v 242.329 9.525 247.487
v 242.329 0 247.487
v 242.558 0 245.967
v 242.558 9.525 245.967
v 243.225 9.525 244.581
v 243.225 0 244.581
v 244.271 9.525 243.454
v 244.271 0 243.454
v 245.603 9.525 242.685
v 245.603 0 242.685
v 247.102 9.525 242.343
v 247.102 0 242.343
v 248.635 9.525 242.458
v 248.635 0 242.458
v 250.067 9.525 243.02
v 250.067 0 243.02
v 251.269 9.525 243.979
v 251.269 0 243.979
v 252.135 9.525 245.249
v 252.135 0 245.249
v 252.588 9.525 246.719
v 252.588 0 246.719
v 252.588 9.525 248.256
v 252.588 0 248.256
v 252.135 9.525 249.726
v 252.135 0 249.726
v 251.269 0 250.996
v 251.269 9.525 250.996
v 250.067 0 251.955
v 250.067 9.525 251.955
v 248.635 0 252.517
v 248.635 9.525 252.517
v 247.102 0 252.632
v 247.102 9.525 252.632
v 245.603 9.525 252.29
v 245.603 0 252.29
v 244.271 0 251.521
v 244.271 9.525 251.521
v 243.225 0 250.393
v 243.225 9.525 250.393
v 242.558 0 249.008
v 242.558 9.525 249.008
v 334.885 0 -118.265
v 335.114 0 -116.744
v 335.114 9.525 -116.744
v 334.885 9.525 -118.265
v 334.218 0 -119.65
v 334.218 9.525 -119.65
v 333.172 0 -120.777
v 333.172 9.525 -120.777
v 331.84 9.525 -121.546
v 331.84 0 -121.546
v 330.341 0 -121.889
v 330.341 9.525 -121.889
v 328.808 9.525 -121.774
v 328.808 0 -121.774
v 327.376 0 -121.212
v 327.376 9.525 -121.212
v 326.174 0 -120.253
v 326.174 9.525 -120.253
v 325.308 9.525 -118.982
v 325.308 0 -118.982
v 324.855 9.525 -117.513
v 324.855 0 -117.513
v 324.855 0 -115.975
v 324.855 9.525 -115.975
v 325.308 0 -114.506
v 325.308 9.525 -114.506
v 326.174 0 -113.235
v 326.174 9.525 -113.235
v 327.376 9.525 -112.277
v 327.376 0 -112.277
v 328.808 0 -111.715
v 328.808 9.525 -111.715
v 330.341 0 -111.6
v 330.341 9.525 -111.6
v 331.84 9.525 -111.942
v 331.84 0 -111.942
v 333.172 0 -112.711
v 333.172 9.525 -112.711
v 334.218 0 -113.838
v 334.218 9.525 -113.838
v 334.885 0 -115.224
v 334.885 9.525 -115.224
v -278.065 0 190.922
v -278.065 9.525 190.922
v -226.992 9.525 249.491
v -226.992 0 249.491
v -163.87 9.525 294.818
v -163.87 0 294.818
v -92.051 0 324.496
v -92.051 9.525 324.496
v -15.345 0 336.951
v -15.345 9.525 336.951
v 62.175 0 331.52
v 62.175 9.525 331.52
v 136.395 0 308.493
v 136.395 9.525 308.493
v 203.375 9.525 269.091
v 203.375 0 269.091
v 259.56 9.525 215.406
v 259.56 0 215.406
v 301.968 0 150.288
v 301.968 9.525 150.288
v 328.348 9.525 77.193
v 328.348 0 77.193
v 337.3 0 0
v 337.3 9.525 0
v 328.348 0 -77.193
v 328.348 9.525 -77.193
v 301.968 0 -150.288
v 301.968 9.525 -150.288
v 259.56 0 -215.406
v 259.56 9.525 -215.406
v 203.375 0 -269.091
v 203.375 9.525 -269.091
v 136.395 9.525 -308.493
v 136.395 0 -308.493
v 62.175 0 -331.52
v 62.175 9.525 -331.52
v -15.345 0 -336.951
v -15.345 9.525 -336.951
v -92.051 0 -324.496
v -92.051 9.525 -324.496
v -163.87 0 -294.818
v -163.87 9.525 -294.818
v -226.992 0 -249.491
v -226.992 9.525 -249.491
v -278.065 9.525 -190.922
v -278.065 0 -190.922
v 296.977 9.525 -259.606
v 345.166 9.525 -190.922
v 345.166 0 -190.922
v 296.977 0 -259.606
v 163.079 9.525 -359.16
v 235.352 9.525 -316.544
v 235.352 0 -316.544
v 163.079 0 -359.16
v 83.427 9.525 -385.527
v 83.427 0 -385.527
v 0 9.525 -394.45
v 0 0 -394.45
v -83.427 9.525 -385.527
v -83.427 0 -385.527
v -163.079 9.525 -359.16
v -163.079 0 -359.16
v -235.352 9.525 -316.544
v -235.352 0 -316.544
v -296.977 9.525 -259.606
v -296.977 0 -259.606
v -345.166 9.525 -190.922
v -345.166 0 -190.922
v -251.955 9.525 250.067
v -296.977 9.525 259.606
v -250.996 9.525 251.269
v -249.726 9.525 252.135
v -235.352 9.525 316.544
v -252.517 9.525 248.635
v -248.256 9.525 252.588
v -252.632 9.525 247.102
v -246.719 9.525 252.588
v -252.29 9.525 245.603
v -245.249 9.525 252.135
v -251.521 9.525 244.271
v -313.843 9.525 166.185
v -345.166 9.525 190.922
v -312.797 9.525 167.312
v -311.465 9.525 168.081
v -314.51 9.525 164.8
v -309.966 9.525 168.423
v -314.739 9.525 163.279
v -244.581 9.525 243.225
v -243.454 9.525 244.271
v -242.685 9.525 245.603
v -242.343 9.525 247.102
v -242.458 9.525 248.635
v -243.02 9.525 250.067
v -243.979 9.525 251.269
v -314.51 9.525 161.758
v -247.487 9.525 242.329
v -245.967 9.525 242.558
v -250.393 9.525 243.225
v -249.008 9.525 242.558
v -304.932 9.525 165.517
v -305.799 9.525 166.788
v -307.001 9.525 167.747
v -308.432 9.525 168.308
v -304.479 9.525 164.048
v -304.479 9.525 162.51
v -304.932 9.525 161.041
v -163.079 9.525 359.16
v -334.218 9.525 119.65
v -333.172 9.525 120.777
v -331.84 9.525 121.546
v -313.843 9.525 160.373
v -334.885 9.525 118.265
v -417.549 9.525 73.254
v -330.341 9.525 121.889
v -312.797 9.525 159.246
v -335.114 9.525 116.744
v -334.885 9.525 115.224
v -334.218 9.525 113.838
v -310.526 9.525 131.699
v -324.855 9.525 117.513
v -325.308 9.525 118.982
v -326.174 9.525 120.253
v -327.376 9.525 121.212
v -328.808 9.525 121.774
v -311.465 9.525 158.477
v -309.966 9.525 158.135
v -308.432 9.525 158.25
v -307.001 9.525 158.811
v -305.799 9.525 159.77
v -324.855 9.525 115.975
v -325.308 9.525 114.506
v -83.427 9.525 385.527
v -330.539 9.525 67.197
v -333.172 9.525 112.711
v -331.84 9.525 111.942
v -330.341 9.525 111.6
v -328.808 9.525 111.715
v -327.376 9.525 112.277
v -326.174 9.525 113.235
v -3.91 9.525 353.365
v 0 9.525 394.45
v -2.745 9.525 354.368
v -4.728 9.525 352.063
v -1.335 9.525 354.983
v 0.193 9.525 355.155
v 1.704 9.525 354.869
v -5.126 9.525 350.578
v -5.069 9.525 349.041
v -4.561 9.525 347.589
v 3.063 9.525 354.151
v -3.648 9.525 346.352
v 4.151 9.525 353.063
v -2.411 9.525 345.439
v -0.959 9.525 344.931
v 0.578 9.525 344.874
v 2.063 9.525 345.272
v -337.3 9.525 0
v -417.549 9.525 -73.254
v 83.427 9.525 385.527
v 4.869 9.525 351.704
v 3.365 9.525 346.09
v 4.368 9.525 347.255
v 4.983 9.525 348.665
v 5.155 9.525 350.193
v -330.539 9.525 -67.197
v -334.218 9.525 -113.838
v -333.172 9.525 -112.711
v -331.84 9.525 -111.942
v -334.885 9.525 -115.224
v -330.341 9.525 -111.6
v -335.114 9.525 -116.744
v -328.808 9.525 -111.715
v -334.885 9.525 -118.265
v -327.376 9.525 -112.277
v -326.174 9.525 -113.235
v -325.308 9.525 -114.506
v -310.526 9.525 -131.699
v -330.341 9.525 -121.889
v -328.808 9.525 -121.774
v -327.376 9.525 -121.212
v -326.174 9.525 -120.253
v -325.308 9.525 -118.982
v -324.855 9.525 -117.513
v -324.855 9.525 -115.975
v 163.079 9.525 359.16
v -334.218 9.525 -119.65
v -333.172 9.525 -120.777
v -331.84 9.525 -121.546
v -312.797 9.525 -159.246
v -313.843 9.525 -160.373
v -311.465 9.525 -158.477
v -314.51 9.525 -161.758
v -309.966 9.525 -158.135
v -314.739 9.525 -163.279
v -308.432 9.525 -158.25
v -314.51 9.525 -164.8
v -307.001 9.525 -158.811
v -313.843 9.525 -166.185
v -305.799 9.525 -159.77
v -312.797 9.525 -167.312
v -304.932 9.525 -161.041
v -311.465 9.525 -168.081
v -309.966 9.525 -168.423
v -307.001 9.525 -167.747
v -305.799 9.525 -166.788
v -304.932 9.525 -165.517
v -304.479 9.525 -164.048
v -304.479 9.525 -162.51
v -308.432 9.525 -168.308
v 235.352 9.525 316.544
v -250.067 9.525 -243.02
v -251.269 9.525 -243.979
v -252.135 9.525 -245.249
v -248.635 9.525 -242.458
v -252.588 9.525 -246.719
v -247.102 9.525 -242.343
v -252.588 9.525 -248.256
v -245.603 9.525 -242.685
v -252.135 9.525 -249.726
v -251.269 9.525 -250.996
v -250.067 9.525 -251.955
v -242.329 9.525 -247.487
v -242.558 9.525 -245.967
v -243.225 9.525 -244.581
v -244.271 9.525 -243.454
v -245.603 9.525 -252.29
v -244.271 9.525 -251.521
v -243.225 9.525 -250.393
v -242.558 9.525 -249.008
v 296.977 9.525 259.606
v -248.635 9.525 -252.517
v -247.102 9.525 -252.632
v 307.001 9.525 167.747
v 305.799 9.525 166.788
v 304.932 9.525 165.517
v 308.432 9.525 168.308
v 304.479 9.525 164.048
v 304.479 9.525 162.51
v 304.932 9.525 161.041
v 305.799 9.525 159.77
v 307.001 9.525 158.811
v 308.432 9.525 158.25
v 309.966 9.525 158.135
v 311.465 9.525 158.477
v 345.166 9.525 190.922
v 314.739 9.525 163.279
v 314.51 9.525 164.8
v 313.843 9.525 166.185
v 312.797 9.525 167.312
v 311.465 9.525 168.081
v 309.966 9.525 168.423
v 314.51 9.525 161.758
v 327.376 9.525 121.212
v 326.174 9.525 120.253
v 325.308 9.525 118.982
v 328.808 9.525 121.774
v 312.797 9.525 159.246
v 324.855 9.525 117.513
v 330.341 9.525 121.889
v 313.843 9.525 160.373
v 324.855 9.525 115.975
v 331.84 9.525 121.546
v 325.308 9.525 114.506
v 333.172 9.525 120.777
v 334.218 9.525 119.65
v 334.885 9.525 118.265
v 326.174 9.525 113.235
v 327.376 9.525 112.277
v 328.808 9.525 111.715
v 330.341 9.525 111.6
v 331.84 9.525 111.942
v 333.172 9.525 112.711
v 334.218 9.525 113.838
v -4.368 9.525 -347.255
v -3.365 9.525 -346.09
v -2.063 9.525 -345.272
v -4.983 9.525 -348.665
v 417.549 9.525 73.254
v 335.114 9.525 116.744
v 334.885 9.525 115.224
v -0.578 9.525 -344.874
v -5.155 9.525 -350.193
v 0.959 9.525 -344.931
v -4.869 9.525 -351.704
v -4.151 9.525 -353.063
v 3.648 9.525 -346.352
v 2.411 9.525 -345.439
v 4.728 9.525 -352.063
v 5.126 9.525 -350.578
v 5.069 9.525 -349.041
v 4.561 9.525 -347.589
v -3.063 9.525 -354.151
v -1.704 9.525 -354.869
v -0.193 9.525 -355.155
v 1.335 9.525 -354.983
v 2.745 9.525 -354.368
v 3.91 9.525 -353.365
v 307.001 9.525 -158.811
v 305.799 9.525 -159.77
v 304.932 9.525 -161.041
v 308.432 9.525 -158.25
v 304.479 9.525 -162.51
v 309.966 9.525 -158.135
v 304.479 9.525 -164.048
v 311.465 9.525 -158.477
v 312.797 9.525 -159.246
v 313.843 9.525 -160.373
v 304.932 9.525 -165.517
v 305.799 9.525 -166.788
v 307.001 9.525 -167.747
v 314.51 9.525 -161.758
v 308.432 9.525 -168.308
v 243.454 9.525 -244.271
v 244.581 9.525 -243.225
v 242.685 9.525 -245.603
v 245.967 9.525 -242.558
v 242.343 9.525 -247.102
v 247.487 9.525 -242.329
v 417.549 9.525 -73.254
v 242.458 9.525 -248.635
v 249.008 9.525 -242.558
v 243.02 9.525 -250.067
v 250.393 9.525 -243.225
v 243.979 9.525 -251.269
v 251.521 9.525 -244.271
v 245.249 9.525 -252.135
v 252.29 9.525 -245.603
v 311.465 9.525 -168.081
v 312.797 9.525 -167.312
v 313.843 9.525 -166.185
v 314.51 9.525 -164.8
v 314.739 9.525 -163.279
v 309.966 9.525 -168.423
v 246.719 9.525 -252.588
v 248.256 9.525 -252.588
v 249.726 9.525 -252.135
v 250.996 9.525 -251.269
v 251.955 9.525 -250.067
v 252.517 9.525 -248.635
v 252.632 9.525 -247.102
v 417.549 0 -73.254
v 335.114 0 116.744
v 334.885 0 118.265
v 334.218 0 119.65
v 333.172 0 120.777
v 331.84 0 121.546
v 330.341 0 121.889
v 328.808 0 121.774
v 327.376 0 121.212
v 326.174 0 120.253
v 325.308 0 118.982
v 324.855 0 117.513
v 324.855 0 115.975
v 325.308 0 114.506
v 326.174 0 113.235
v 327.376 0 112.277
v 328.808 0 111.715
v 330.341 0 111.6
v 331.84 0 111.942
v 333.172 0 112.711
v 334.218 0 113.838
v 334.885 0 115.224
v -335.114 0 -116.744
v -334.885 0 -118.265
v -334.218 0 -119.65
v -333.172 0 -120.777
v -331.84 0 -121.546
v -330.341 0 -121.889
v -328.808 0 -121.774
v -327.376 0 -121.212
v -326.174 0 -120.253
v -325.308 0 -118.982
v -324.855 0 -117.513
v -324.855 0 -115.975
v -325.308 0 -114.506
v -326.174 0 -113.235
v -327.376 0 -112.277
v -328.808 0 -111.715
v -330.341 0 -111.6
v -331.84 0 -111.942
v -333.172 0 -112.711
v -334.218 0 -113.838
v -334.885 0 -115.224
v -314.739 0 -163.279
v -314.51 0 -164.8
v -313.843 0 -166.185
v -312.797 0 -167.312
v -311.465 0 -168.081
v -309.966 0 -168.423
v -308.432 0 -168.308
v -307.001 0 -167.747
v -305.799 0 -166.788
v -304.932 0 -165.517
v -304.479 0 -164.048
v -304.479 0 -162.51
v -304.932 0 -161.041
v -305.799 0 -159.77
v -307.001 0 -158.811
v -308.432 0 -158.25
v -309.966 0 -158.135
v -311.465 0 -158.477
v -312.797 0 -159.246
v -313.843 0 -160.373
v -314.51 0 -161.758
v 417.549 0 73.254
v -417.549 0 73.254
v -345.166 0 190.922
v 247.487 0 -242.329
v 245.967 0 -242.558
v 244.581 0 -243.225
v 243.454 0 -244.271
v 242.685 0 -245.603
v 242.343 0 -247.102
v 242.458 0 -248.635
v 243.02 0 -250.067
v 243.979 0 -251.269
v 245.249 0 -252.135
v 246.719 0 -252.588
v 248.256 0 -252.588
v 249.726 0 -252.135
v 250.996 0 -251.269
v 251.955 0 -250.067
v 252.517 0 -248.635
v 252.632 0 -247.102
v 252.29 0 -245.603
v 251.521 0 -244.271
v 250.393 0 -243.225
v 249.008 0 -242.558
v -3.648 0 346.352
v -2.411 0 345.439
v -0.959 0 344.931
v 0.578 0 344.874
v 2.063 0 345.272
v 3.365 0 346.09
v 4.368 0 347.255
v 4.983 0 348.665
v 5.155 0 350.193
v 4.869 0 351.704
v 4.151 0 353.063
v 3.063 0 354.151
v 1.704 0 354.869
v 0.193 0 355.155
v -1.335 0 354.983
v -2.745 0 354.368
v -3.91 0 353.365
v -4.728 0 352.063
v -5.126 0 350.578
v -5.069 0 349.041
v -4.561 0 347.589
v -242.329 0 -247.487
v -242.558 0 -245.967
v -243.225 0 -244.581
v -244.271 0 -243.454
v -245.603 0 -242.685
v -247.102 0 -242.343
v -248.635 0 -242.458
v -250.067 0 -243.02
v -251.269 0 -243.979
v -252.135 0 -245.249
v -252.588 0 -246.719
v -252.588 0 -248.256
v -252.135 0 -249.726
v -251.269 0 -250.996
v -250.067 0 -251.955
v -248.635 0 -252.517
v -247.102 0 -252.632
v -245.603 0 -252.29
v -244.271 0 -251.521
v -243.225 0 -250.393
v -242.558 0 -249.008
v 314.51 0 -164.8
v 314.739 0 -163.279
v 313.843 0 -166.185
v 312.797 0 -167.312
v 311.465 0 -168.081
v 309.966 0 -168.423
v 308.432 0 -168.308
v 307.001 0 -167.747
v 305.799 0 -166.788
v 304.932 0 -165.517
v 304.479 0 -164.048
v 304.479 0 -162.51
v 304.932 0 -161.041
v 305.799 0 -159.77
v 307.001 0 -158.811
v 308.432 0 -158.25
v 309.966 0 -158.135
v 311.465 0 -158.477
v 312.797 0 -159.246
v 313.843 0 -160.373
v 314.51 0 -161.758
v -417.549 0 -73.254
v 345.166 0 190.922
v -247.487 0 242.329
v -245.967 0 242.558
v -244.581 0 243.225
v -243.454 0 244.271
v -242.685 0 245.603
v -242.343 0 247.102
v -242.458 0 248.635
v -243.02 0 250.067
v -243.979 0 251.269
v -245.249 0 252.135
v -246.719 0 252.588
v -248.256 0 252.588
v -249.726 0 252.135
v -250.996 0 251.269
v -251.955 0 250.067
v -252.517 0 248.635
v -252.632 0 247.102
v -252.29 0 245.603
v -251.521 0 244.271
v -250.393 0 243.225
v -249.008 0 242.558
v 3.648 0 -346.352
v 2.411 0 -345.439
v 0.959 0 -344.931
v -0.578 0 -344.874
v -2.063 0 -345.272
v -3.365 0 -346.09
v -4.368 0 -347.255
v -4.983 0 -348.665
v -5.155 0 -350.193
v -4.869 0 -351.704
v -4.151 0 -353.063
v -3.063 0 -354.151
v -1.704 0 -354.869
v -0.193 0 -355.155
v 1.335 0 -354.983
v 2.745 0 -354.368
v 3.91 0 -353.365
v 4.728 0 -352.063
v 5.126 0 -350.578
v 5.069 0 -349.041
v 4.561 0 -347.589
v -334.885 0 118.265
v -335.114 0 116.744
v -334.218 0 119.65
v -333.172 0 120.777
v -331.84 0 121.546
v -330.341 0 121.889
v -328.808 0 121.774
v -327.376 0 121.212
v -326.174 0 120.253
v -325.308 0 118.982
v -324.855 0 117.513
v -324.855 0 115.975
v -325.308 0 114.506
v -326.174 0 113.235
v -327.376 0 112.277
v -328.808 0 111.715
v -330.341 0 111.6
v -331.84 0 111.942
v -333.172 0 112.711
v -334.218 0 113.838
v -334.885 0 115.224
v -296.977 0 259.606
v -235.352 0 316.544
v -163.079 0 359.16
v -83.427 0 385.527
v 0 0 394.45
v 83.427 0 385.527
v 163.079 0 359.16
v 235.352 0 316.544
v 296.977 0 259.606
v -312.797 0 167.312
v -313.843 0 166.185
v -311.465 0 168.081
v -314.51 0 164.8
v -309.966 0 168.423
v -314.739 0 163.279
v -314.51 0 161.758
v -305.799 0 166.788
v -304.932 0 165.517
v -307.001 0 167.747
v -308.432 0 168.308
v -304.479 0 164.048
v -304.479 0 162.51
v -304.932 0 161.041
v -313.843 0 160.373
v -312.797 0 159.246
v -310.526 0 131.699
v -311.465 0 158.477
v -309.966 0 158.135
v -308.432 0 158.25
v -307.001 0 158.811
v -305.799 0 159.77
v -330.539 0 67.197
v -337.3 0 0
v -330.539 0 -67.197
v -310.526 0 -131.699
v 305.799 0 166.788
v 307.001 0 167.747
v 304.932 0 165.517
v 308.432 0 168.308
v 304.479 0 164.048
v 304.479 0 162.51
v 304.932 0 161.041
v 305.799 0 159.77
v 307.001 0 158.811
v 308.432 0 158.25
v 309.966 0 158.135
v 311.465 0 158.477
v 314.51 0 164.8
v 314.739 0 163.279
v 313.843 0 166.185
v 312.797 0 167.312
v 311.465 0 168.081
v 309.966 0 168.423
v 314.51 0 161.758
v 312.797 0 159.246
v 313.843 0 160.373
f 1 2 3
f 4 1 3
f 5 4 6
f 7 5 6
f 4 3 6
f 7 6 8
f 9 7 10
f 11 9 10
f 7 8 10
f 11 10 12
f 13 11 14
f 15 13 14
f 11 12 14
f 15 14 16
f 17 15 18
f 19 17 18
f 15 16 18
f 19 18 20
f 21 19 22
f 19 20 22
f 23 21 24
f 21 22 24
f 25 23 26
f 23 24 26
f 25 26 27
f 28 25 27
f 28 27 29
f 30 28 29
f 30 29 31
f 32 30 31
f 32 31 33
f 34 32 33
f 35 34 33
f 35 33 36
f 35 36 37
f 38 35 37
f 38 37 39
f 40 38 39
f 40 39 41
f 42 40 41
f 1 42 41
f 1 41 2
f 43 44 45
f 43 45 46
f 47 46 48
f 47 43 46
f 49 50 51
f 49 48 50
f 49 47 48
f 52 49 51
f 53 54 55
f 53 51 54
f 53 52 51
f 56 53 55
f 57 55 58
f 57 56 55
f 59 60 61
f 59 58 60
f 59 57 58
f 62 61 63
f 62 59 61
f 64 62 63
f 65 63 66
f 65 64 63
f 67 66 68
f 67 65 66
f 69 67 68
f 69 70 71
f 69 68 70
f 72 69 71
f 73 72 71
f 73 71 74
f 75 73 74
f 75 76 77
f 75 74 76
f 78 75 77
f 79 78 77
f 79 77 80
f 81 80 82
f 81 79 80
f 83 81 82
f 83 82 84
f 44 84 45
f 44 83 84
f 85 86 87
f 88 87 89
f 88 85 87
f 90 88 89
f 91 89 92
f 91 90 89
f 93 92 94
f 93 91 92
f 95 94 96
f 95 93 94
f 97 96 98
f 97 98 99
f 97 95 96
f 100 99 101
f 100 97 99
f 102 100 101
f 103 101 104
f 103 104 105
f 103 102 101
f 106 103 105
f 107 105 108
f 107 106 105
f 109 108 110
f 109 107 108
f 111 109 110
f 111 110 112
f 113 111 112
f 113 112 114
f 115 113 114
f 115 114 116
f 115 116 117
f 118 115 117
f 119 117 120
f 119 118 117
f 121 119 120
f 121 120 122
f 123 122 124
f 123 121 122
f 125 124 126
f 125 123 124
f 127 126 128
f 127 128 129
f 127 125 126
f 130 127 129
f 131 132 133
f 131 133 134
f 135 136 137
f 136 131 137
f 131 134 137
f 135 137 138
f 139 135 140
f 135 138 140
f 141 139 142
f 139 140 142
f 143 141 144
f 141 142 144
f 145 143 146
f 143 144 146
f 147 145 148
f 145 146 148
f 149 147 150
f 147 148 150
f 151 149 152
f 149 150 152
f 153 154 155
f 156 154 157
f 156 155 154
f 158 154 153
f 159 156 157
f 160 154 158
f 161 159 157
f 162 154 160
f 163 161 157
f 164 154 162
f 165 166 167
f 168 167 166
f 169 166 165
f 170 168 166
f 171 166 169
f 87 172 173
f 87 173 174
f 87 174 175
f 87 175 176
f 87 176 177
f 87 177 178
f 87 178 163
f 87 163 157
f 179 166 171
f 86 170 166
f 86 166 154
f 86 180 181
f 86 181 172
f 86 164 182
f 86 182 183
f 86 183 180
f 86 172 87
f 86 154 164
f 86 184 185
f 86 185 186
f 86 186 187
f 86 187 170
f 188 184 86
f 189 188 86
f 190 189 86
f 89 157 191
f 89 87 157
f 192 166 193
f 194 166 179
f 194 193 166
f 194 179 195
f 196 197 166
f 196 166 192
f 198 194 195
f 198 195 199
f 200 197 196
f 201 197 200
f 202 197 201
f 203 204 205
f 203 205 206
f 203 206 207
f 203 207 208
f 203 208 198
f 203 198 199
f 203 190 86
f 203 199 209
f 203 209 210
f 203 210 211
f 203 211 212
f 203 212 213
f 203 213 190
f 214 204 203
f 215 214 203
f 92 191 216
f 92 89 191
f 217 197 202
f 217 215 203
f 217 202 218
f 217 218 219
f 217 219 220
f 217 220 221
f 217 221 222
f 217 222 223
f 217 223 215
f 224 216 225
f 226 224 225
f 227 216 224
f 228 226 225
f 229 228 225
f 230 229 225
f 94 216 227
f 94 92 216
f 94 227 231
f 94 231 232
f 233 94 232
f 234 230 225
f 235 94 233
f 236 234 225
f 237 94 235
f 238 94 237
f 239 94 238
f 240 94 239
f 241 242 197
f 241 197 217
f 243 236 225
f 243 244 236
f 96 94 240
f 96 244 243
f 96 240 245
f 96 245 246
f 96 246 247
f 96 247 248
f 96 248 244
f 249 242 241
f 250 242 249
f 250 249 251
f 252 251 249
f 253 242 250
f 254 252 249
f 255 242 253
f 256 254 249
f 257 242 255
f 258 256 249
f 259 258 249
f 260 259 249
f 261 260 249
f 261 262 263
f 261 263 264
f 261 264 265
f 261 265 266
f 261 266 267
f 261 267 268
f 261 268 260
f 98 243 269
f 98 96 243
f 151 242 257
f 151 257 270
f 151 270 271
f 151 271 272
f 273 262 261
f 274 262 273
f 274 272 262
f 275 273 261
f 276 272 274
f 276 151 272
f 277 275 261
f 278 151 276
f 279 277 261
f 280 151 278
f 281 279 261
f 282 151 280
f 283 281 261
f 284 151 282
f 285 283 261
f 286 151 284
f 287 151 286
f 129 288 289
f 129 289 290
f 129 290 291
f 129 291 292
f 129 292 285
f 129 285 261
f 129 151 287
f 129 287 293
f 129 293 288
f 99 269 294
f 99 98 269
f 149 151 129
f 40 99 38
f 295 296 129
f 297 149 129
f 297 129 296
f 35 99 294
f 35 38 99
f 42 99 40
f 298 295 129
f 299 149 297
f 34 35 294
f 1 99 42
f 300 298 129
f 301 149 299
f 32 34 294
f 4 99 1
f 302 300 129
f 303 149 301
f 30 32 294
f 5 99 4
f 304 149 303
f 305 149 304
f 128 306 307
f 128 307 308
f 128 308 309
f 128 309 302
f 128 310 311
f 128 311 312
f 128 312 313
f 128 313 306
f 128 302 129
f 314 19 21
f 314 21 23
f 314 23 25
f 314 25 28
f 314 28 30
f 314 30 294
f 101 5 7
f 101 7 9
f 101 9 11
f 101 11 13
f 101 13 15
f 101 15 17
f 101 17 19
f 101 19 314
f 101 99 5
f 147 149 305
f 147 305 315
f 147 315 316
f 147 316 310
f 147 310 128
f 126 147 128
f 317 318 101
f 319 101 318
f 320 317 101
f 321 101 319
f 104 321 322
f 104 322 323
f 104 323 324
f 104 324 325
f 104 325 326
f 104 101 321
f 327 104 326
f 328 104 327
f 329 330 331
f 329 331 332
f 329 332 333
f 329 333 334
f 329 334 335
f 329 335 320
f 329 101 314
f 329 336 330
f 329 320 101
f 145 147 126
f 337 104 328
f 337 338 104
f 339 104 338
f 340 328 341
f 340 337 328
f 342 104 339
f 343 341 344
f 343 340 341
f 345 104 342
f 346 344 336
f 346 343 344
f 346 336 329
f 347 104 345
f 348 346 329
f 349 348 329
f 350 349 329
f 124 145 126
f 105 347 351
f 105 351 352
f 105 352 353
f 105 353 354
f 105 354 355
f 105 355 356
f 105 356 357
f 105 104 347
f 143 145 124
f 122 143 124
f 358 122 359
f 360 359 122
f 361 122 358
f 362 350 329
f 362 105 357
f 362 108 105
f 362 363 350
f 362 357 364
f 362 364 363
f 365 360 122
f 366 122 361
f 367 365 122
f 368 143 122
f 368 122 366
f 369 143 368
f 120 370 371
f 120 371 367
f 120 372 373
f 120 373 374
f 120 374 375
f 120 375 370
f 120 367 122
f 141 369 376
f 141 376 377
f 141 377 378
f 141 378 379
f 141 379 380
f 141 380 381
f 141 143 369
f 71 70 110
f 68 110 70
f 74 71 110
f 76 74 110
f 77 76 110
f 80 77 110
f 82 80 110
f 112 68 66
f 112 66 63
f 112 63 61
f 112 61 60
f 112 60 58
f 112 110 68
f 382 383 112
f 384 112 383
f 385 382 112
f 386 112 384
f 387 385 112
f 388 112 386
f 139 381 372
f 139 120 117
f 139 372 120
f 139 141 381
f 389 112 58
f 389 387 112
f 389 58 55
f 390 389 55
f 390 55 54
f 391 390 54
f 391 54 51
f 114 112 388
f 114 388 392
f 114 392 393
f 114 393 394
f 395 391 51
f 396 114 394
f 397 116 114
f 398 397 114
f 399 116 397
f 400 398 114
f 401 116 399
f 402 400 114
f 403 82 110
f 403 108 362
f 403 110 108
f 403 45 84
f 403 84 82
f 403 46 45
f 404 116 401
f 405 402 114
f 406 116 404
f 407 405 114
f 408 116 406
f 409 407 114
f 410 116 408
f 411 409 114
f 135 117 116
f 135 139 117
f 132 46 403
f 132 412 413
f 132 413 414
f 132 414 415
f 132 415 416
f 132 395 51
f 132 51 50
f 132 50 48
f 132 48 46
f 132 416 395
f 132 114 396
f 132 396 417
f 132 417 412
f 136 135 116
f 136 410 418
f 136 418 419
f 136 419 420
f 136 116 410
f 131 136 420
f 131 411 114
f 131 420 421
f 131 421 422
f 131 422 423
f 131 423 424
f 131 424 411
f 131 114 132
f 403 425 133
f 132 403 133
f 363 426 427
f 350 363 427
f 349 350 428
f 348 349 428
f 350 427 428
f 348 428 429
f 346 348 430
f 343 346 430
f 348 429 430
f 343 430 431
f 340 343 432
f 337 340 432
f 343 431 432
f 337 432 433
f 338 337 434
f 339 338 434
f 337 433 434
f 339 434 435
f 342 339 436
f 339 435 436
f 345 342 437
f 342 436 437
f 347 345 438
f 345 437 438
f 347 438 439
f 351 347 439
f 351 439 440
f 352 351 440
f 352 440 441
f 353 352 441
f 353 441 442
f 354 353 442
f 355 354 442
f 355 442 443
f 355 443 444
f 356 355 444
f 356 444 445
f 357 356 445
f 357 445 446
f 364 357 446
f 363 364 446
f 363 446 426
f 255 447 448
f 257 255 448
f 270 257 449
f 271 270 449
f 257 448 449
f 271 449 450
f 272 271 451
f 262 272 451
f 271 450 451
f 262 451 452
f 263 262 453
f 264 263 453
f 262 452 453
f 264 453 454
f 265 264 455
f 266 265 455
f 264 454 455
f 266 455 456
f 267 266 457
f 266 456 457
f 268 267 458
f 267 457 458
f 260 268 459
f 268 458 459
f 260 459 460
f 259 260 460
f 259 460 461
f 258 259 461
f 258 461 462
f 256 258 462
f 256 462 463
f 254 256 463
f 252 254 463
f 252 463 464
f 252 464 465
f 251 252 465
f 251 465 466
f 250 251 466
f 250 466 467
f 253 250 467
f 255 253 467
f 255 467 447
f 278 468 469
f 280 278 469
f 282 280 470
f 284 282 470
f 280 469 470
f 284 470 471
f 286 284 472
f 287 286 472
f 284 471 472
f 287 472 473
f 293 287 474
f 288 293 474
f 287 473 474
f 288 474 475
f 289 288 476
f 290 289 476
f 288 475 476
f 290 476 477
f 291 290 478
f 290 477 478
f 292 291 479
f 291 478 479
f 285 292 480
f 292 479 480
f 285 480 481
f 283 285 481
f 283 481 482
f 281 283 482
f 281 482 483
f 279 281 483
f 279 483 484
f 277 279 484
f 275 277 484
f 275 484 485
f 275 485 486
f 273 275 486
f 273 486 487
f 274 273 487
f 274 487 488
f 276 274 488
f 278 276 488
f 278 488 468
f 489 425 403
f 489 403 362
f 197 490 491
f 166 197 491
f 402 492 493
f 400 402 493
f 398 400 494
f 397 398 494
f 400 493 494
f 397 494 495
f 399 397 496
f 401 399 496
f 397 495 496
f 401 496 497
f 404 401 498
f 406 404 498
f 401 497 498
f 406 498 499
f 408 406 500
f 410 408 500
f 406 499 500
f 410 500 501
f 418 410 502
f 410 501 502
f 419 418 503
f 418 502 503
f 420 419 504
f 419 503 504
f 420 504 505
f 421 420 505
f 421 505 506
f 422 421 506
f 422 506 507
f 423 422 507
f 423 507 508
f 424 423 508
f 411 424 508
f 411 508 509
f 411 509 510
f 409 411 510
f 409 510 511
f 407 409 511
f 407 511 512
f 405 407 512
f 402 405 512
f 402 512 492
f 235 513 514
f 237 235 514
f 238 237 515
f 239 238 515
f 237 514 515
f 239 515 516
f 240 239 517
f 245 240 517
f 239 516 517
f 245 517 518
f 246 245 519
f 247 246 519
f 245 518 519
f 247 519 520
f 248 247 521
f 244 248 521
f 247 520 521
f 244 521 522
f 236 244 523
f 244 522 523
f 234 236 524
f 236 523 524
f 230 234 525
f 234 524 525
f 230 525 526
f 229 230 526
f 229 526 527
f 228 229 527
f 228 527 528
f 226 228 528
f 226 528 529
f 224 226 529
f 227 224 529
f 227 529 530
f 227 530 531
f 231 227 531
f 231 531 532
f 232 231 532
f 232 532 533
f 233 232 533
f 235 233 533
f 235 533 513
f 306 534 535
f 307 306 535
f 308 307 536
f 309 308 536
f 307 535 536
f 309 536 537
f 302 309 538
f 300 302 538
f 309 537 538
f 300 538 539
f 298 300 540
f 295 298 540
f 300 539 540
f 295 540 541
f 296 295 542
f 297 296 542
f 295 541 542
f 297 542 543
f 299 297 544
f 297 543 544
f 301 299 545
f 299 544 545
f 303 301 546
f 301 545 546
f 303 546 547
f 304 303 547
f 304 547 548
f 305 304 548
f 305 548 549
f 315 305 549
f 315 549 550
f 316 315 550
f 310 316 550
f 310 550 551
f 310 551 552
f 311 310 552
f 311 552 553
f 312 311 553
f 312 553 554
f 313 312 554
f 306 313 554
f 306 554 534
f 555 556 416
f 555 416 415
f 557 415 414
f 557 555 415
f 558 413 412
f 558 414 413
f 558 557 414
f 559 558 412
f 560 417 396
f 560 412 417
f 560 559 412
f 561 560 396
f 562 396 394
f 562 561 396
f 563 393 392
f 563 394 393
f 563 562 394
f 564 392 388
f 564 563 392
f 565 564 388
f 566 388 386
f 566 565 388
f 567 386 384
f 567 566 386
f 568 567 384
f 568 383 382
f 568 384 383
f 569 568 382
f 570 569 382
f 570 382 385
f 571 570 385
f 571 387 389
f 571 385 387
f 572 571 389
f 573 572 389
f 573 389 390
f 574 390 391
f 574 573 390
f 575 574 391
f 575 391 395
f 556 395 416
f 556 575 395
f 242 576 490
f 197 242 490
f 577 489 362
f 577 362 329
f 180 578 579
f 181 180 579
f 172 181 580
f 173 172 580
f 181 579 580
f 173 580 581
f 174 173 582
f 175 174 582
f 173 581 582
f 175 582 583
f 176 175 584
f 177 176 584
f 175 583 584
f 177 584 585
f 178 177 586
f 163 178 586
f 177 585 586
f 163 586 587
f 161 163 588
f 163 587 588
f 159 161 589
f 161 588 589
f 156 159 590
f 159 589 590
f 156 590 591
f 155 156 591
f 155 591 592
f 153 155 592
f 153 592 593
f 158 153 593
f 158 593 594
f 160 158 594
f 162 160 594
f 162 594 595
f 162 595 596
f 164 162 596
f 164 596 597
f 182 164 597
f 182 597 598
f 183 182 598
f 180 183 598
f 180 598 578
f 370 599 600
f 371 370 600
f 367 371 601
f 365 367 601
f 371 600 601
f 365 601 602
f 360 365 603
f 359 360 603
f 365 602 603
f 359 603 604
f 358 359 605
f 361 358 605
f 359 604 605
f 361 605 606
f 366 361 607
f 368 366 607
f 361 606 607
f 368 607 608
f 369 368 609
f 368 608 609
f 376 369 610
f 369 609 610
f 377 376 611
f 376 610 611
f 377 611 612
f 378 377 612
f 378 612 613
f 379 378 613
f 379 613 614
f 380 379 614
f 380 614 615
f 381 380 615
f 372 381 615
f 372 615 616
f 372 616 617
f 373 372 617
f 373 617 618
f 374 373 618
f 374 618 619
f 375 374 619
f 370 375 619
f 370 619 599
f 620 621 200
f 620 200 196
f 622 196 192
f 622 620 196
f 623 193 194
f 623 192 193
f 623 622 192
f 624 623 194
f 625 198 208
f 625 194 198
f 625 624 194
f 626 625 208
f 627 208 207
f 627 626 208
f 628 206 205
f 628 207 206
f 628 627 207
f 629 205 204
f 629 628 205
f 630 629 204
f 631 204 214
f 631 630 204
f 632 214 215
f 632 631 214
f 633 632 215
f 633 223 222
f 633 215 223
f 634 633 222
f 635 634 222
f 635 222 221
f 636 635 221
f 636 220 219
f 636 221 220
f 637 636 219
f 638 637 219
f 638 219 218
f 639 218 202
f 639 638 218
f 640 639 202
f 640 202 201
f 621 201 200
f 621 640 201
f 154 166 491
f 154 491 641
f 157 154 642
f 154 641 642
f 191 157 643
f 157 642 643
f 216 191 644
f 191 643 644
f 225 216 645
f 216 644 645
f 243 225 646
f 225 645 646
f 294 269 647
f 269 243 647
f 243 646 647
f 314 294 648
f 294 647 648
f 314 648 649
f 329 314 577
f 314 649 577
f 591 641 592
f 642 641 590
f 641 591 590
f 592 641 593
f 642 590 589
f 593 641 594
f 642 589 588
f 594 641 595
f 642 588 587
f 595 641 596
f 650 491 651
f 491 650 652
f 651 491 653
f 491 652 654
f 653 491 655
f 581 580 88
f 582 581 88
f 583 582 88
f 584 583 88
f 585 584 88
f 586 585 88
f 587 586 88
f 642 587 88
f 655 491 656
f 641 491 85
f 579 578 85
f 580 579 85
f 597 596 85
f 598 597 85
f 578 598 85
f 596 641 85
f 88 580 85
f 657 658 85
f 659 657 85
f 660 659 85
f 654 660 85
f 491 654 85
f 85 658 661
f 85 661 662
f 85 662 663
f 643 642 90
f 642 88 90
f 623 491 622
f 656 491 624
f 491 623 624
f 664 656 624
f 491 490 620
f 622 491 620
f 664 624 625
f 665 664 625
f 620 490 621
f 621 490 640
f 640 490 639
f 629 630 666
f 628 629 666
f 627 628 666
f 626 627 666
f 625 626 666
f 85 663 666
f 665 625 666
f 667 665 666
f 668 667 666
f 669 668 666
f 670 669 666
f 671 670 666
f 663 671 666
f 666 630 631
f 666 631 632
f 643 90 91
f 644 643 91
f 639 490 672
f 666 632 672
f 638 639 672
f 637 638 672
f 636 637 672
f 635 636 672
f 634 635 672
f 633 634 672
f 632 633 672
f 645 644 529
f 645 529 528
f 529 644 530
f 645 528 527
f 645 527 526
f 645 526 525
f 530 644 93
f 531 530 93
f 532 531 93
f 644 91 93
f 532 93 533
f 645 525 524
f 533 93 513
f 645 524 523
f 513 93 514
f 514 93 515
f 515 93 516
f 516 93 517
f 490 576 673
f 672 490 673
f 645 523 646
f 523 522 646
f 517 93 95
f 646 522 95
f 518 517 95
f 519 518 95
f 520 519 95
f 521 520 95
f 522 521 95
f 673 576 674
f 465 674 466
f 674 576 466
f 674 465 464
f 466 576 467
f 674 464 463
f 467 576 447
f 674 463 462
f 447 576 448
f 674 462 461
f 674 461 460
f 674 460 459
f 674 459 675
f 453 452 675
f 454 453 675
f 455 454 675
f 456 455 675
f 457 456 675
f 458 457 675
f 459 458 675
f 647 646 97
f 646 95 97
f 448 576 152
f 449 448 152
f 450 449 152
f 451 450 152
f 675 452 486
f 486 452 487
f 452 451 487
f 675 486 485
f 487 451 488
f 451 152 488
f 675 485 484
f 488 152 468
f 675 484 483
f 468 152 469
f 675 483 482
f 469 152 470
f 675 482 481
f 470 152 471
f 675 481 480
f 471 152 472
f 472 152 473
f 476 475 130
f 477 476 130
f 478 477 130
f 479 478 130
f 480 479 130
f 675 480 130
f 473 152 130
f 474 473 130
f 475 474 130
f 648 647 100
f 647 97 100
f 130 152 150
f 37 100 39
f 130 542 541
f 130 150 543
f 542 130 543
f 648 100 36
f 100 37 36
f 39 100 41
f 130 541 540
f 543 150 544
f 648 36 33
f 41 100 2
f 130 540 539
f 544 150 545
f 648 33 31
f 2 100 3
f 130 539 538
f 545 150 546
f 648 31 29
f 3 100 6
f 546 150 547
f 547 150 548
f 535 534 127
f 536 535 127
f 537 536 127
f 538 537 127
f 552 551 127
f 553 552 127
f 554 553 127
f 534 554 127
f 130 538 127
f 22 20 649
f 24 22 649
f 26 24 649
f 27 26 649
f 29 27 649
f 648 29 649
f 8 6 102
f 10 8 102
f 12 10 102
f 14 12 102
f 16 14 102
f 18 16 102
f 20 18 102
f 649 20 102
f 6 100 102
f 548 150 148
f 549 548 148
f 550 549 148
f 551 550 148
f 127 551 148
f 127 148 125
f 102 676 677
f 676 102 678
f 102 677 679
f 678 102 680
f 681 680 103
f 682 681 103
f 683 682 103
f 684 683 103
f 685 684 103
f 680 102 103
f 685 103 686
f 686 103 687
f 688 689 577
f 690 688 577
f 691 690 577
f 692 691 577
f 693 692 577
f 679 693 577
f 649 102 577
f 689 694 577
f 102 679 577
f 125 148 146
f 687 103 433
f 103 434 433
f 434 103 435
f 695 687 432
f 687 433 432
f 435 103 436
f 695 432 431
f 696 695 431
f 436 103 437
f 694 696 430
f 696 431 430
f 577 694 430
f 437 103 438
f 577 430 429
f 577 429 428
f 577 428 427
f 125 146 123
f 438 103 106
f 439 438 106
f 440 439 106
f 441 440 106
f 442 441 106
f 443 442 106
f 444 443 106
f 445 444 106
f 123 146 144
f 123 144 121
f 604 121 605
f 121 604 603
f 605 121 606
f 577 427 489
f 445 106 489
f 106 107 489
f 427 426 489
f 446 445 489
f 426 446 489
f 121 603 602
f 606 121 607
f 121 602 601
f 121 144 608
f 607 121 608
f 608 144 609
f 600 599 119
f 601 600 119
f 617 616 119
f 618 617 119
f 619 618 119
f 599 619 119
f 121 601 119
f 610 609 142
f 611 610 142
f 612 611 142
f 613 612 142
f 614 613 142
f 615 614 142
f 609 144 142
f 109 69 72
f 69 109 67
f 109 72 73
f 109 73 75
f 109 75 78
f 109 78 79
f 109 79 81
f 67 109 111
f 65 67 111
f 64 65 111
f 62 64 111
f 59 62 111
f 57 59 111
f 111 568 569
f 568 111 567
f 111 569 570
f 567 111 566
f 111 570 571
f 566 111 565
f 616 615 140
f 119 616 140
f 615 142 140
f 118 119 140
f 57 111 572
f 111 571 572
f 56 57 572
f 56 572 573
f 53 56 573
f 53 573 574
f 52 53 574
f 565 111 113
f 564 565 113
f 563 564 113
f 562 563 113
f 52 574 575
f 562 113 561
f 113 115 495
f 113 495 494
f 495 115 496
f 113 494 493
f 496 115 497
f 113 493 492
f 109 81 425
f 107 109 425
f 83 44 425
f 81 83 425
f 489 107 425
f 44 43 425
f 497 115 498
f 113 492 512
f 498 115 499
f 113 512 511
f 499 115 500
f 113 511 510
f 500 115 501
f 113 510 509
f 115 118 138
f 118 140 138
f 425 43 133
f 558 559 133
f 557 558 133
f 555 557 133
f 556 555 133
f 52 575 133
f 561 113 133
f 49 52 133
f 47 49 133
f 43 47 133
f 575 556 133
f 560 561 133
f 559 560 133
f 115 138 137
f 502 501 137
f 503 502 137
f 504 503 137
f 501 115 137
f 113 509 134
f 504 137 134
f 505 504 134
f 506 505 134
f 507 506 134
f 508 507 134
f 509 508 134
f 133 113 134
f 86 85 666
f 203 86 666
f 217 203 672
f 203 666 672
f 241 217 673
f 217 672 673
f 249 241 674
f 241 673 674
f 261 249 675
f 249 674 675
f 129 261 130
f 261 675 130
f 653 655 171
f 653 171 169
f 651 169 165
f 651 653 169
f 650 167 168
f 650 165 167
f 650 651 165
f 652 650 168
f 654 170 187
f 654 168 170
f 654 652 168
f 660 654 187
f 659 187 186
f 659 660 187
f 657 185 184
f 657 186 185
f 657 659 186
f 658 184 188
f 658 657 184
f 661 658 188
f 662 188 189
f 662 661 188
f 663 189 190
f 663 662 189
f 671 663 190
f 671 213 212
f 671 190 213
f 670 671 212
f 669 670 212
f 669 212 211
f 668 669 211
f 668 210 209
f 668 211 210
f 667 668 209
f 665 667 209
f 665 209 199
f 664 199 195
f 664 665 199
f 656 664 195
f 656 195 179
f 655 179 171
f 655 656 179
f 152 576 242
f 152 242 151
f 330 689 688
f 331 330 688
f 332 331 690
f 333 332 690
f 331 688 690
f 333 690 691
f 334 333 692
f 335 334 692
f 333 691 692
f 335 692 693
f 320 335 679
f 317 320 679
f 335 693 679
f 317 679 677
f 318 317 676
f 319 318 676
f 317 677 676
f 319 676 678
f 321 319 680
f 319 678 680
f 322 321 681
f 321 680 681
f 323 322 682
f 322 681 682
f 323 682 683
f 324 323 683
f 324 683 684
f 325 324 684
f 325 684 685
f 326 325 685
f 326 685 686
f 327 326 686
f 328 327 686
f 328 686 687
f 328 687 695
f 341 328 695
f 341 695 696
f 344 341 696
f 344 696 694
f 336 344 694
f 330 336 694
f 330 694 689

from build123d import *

# Parameters (mm, degrees)
SKETCH1_R               = 394.45
SKETCH1_R_2             = 337.3
BOSS_EXTRUDE1_DEPTH     = 9.525
SKETCH2_W               = 63.5
SKETCH2_H               = 206.256826312
CUT_EXTRUDE1_DEPTH      = 10.525
BOSS_EXTRUDE4_DEPTH     = 9.525
F_3_8_CLEARANCE_HOLE1_D = 10.31748
MIRROR3_COPY_1_D        = 10.31748
F_3_8_CLEARANCE_HOLE2_D = 10.31748
CIRPATTERN1_COUNT       = 8
CUT_EXTRUDE5_DEPTH      = 10.525
MIRROR9_COPY_1_DEPTH    = 10.525


with BuildPart() as part:
    # Sketch1 → Boss-Extrude1 (new body)
    with BuildSketch(Plane(origin=(0, 0, 0), x_dir=(1, 0, 0), z_dir=(0, 1, 0))):
        Circle(SKETCH1_R)
        Circle(SKETCH1_R_2, mode=Mode.SUBTRACT)
    extrude(amount=BOSS_EXTRUDE1_DEPTH)

    # Sketch2 → Cut-Extrude1 (cut, through all)
    with BuildSketch(Plane(origin=(0, 9.525, 0), x_dir=(1, 0, 0), z_dir=(0, 1, 0))):
        with Locations((-412.48, 0)):
            Rectangle(SKETCH2_W, SKETCH2_H)
    extrude(amount=-CUT_EXTRUDE1_DEPTH, mode=Mode.SUBTRACT)

    # Sketch5 → Boss-Extrude4 (add)
    with BuildSketch(Plane(origin=(0, 0, 0), x_dir=(1, 0, 0), z_dir=(0, 1, 0))):
        with BuildLine():
            Line((278.064904497, 190.921970677), (417.548677299, 190.921970677))
            Line((417.548677299, 190.921970677), (417.548677299, -190.921970677))
            Line((417.548677299, -190.921970677), (278.064904497, -190.921970677))
            ThreePointArc((278.064904497, -190.921970677), (337.3, 0), (278.064904497, 190.921970677))
        make_face()
    boss_extrude4 = extrude(amount=BOSS_EXTRUDE4_DEPTH)

    # Mirror1: Boss-Extrude4 across plane
    add(boss_extrude4.mirror(Plane(origin=(0, 0, 0), x_dir=(0, 0, 1), z_dir=(1, 0, 0))))

    # 3/8 Clearance Hole1 (through all)
    with Locations(Plane(origin=(0, 9.525, 0), x_dir=(-1, 0, 0), z_dir=(0, 1, 0))):
        with Locations((-329.955744274, 116.744193948), (-309.58033967, 163.278943192)):
            f_3_8_clearance_hole1 = Hole(F_3_8_CLEARANCE_HOLE1_D / 2)

    # Mirror2: 3/8 Clearance Hole1 across plane
    add(f_3_8_clearance_hole1.mirror(Plane(origin=(0, 0, 0), x_dir=(0, 0, 1), z_dir=(1, 0, 0))), mode=Mode.SUBTRACT)

    # Mirror3: 3/8 Clearance Hole1 across plane
    add(f_3_8_clearance_hole1.mirror(Plane.XY), mode=Mode.SUBTRACT)

    # Mirror3 copy 1 (through all)
    with Locations(Plane(origin=(0, 9.525, 0), x_dir=(1, 0, 0), z_dir=(0, 1, 0))):
        with Locations((-329.955744274, 116.744193948), (-309.58033967, 163.278943192)):
            Hole(MIRROR3_COPY_1_D / 2)

    # 3/8 Clearance Hole2 (through all)
    with Locations(Plane(origin=(0, 9.525, 0), x_dir=(1, 0, 0), z_dir=(0, 1, 0))):
        with Locations((247.487373415, -247.487373415)):
            f_3_8_clearance_hole2 = Hole(F_3_8_CLEARANCE_HOLE2_D / 2)

    # CirPattern1: 3/8 Clearance Hole2 ×8 about axis, 2 skipped
    cirpattern1_axis = Axis((0, 0, 0), (0, 1, 0))
    add([f_3_8_clearance_hole2.rotate(cirpattern1_axis, i * 360 / CIRPATTERN1_COUNT) for i in range(1, CIRPATTERN1_COUNT) if i not in (1, 5)], mode=Mode.SUBTRACT)

    # Sketch12 → Cut-Extrude5 (cut, through all)
    with BuildSketch(Plane(origin=(0, 0, 0), x_dir=(1, 0, 0), z_dir=(0, 1, 0))):
        Polygon((-417.548677299, 190.921970677), (-417.548677299, 73.2544087), (-345.166052231, 190.921970677), align=None)
    cut_extrude5 = extrude(amount=CUT_EXTRUDE5_DEPTH, mode=Mode.SUBTRACT)

    # Mirror8: Cut-Extrude5 across plane
    add(cut_extrude5.mirror(Plane.XY), mode=Mode.SUBTRACT)

    # Mirror9: Cut-Extrude5 across plane
    add(cut_extrude5.mirror(Plane(origin=(0, 0, 0), x_dir=(0, 0, 1), z_dir=(1, 0, 0))), mode=Mode.SUBTRACT)

    # Mirror9 copy 1 sketch → Mirror9 copy 1 (cut, through all)
    with BuildSketch(Plane(origin=(0, 0, 0), x_dir=(-1, 0, 0), z_dir=(0, 1, 0))):
        Polygon((-417.548677299, 190.921970677), (-417.548677299, 73.2544087), (-345.166052231, 190.921970677), align=None)
    extrude(amount=MIRROR9_COPY_1_DEPTH, mode=Mode.SUBTRACT)


solid = part.part
